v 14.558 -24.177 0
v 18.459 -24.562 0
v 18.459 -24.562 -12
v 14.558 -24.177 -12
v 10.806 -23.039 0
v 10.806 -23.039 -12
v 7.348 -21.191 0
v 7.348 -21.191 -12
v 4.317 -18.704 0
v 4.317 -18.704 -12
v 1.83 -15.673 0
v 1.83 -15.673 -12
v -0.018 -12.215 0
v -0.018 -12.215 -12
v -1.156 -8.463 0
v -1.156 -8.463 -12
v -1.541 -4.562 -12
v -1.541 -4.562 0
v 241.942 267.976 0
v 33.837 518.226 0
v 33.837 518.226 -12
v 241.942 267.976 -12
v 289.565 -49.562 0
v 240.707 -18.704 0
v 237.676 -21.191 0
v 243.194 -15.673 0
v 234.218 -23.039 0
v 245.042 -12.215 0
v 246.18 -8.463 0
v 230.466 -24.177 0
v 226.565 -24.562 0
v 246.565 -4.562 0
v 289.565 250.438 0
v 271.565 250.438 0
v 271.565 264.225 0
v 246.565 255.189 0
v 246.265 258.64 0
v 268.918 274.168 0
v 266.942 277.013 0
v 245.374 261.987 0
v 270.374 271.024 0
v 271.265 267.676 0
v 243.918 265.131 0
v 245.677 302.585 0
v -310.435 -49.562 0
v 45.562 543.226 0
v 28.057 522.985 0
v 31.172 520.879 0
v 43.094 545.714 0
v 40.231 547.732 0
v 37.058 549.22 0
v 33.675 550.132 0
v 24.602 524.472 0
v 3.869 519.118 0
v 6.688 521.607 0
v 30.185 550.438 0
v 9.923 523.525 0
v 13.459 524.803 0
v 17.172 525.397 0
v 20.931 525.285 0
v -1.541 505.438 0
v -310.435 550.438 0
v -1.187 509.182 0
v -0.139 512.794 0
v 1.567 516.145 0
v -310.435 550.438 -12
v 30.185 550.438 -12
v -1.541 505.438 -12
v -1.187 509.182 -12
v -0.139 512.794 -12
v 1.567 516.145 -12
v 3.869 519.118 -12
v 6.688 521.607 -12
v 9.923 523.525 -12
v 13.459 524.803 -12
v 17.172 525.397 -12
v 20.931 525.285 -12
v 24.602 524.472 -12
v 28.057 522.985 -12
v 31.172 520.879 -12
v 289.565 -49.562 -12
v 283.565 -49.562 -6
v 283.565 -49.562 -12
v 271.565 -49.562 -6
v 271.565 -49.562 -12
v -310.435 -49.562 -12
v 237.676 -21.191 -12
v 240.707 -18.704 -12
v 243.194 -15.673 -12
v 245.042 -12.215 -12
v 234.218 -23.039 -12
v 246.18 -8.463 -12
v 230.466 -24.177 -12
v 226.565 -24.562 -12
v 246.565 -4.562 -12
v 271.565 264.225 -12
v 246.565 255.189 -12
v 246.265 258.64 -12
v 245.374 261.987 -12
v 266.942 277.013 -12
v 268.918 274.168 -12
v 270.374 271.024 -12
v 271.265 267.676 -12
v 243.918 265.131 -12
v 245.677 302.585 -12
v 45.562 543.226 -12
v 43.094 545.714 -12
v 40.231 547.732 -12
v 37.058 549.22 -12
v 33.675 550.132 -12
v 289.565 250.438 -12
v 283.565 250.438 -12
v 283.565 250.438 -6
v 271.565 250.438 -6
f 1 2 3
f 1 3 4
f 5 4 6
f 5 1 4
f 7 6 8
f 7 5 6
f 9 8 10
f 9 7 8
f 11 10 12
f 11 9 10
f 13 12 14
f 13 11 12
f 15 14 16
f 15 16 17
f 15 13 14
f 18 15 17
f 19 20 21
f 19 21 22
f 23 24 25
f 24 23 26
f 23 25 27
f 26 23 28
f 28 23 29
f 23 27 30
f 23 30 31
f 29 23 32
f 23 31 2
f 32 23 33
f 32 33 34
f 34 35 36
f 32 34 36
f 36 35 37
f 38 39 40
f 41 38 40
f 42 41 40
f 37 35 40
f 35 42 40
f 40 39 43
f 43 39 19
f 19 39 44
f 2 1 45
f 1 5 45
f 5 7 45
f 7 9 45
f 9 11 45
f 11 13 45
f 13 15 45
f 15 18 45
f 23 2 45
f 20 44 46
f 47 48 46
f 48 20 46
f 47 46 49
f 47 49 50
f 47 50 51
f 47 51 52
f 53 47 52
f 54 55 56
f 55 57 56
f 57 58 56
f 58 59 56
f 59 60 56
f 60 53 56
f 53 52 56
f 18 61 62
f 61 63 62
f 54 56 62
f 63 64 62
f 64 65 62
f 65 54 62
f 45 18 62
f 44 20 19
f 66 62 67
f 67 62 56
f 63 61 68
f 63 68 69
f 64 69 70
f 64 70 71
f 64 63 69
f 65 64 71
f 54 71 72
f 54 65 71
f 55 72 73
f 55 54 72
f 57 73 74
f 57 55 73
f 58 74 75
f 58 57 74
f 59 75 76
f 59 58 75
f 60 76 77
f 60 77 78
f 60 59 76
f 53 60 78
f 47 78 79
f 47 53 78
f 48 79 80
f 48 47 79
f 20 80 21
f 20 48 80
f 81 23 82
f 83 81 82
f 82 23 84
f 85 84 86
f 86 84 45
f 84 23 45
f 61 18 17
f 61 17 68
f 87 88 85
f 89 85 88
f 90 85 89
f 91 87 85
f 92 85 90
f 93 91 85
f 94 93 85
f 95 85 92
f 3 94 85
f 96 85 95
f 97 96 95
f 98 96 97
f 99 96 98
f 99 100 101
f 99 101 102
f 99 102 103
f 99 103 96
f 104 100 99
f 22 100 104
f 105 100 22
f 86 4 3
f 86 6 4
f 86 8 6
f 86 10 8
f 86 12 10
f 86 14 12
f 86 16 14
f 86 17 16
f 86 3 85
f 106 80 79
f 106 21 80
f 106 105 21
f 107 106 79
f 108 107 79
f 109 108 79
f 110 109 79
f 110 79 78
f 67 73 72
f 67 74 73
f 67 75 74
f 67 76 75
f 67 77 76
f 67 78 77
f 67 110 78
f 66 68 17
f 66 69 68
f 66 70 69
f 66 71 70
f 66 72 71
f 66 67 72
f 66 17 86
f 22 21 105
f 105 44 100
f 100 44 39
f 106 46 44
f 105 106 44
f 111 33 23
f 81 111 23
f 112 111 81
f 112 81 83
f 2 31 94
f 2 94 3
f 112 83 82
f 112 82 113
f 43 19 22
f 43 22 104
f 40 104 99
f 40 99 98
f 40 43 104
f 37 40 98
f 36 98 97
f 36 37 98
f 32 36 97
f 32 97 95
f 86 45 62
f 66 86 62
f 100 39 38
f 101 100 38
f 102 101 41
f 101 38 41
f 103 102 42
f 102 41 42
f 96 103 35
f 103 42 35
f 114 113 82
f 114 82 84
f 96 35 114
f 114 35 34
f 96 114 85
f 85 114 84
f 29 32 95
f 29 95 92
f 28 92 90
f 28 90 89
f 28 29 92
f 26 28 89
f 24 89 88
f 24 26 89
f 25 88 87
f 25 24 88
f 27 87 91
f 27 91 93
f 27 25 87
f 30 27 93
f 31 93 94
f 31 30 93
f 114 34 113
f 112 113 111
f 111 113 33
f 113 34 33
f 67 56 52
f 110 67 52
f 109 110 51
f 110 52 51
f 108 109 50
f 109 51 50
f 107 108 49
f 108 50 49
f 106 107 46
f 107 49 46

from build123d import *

# Parameters (mm, degrees)
BOSS_EXTRUDE1_DEPTH = 12
SKETCH2_W           = 12
SKETCH2_H           = 300
CUT_EXTRUDE1_DEPTH  = 6


with BuildPart() as part:
    # Sketch1 → Boss-Extrude1 (new body)
    with BuildSketch(Plane.XY):
        with BuildLine():
            Line((45.562175866, 543.226317211), (245.677247379, 302.584656473))
            Line((245.677247379, 302.584656473), (266.942237958, 277.013155986))
            ThreePointArc((266.942237958, 277.013155986), (270.373567716, 271.024119998), (271.564632115, 264.225300867))
            Line((271.564632115, 264.225300867), (271.564632115, 250.438462092))
            Line((271.564632115, 250.438462092), (289.564632115, 250.438462092))
            Line((289.564632115, 250.438462092), (289.564632115, -49.561537908))
            Line((289.564632115, -49.561537908), (-310.435367885, -49.561537908))
            Line((-310.435367885, -49.561537908), (-310.435367885, 550.438462092))
            Line((-310.435367885, 550.438462092), (30.184570023, 550.438462092))
            ThreePointArc((30.184570023, 550.438462092), (38.677004822, 548.545879113), (45.562175866, 543.226317211))
        make_face()
        with BuildLine():
            Line((-1.540507591, -4.561537908), (-1.540507591, 505.438462092))
            ThreePointArc((-1.540507591, 505.438462092), (11.660673278, 524.247397693), (33.837098252, 518.226317211))
            Line((33.837098252, 518.226317211), (241.942237958, 267.976468219))
            ThreePointArc((241.942237958, 267.976468219), (245.373567716, 261.98743223), (246.564632115, 255.1886131))
            Line((246.564632115, 255.1886131), (246.564632115, -4.561537908))
            ThreePointArc((246.564632115, -4.561537908), (240.706767739, -18.703673532), (226.564632115, -24.561537908))
            Line((226.564632115, -24.561537908), (18.459492409, -24.561537908))
            ThreePointArc((18.459492409, -24.561537908), (4.317356785, -18.703673532), (-1.540507591, -4.561537908))
        make_face(mode=Mode.SUBTRACT)
    extrude(amount=-BOSS_EXTRUDE1_DEPTH)

    # Sketch2 → Cut-Extrude1 (cut)
    with BuildSketch(Plane(origin=(0, 0, -12), x_dir=(-1, 0, 0), z_dir=(0, 0, -1))):
        with Locations((-277.564632115, 100.438462092)):
            Rectangle(SKETCH2_W, SKETCH2_H)
    extrude(amount=-CUT_EXTRUDE1_DEPTH, mode=Mode.SUBTRACT)


solid = part.part
